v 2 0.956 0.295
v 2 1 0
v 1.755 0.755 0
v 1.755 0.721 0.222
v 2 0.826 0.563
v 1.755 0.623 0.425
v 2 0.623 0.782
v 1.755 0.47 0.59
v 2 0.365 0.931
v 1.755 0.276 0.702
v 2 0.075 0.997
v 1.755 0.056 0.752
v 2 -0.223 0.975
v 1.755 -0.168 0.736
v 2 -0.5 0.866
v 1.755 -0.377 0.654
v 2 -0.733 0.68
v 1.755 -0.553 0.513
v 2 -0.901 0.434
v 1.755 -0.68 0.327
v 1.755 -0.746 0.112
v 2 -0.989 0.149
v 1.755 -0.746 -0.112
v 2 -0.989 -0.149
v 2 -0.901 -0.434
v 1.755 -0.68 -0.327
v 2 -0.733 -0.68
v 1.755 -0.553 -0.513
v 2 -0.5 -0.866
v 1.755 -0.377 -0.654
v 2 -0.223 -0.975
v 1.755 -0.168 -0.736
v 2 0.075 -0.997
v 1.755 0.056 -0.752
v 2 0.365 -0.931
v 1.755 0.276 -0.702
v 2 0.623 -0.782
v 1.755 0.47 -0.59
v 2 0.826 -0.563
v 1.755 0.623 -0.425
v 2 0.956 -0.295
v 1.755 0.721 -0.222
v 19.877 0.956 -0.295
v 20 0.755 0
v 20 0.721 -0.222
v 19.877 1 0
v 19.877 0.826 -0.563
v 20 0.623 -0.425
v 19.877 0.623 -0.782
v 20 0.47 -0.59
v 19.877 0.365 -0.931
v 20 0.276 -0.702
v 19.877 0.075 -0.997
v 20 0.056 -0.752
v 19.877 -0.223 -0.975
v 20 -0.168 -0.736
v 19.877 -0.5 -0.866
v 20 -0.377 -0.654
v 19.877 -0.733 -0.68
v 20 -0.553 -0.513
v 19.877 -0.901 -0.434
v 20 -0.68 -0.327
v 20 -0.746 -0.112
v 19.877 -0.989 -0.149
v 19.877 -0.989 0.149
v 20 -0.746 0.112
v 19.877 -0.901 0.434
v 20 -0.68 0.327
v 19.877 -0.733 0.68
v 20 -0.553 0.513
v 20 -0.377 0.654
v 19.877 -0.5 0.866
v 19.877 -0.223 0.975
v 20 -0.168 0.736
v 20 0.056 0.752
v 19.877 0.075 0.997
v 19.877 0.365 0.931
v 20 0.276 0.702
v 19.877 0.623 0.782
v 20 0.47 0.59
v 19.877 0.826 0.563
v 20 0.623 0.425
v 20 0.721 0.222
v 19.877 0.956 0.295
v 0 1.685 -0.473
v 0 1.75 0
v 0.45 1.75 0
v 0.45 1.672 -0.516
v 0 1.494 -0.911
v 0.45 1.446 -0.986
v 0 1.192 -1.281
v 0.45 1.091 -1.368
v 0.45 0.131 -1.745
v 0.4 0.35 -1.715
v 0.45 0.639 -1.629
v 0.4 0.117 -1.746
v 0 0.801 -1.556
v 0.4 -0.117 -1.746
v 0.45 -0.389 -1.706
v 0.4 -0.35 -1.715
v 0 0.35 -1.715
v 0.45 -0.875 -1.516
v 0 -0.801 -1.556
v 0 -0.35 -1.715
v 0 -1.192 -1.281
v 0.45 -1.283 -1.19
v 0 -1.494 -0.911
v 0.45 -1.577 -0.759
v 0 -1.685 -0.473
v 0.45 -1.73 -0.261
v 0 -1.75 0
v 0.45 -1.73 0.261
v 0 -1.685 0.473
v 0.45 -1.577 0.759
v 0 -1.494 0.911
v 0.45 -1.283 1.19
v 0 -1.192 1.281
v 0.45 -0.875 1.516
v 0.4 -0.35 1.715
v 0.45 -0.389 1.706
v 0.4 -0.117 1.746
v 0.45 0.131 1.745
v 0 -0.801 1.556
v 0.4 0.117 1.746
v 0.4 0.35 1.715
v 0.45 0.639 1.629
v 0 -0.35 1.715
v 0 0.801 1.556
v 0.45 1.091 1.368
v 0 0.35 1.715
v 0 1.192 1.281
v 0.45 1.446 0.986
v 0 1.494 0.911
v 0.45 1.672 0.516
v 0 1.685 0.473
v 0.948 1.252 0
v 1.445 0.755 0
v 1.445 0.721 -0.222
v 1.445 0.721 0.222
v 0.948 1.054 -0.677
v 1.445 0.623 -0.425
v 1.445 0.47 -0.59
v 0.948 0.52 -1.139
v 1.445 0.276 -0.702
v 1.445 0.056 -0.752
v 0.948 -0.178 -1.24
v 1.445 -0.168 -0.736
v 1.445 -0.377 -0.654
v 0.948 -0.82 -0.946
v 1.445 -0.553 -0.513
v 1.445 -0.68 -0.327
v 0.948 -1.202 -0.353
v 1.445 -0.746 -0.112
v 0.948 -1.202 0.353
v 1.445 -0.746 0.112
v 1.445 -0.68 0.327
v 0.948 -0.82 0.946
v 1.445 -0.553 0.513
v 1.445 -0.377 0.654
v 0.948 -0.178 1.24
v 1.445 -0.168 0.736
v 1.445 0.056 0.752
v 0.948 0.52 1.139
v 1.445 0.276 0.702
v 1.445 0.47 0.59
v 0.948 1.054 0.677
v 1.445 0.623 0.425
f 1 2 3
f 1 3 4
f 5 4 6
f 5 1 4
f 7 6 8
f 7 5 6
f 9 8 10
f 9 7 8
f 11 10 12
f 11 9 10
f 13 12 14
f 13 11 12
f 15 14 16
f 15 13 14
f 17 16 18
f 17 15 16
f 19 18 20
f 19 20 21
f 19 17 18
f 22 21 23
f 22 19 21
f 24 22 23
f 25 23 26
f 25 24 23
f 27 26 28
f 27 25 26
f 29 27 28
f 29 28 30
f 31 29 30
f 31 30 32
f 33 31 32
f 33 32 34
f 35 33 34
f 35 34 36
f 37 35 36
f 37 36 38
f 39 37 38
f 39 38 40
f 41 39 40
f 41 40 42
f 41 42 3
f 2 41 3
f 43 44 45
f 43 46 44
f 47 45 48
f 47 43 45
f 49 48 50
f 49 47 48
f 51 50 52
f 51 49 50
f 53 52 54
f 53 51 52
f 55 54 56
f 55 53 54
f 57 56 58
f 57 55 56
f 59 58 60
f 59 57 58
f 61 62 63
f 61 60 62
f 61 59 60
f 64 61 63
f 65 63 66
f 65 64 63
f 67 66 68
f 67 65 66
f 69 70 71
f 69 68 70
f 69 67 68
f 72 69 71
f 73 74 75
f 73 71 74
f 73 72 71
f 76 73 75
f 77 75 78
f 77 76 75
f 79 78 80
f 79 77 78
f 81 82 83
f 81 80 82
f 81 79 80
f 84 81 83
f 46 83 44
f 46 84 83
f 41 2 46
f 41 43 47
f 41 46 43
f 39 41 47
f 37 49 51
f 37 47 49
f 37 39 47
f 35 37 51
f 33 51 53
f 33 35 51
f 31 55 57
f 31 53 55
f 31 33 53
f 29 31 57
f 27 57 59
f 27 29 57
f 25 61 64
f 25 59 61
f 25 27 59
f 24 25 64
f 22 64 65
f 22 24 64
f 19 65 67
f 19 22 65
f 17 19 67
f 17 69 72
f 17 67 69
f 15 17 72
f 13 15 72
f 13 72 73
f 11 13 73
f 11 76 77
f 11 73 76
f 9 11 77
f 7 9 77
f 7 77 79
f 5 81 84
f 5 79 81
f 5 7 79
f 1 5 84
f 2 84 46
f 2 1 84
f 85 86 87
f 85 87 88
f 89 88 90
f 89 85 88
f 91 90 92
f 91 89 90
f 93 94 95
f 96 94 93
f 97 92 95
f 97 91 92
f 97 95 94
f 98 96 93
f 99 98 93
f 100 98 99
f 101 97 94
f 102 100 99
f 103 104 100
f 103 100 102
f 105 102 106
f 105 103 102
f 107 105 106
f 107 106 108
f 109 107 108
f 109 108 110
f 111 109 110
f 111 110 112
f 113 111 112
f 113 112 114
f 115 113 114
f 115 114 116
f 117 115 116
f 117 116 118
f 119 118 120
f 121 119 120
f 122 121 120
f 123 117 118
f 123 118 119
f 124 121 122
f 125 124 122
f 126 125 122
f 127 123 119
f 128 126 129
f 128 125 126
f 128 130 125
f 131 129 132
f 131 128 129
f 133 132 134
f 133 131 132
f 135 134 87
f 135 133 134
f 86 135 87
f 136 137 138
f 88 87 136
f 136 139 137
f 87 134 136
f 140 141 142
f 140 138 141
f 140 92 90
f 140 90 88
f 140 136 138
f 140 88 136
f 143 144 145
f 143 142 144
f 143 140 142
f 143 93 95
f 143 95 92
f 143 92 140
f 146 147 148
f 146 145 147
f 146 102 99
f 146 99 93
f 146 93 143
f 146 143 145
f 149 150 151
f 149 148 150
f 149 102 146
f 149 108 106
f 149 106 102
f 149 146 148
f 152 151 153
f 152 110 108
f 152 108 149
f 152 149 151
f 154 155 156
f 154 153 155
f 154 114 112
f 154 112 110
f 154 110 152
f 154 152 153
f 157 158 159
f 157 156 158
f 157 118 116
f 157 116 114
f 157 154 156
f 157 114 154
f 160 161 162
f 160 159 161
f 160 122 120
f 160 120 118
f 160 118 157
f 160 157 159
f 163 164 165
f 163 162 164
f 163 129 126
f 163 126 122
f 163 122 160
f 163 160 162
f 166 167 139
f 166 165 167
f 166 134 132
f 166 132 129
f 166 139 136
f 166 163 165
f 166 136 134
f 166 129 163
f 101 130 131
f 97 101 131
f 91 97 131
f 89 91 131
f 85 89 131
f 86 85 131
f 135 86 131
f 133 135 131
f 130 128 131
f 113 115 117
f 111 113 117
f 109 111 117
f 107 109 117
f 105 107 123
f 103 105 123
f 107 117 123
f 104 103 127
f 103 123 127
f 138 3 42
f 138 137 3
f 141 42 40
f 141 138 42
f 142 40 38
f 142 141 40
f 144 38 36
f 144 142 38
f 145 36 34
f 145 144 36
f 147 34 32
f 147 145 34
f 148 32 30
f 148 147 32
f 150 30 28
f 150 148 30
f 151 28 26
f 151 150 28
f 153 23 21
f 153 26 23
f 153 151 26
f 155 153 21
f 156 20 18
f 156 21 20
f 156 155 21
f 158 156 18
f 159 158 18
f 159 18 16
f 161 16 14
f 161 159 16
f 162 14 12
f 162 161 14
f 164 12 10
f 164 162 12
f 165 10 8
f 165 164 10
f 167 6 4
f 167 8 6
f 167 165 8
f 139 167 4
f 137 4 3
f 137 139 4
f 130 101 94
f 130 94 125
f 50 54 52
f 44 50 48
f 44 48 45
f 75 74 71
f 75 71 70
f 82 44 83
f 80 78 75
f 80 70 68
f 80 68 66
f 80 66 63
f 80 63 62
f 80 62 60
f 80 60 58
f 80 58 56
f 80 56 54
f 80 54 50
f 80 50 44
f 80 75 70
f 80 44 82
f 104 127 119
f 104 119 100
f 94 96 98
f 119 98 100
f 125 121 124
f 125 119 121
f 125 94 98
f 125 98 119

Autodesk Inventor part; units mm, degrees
ref_plane "YZ Plane" through (0, 0, 0) normal (1, 0, 0) x (0, 1, 0)
ref_plane "XZ Plane" through (0, 0, 0) normal (0, 1, 0) x (-1, 0, 0)
sketch "Sketch1" plane through (0, 0, 0) normal (0, 0, 1) x (1, 0, 0)
  line L0 (0, 0) -> (20, 0)
  line L1 (20, 0) -> (20, 1)
  line L2 (20, 1) -> (2, 1)
  line L3 (2, 1) -> (1.7546, 0.7546)
  line L4 (1.7546, 0.7546) -> (1.4454, 0.7546)
  line L5 (1.4454, 0.7546) -> (0.45, 1.75)
  line L6 (0.45, 1.75) -> (0, 1.75)
  line L7 (0, 1.75) -> (0, 0)
  line L8 (2, 1) -> (1.2, 1) construction
  line L9 (-4, 0) -> (24, 0) projected
  line L10 (0, 2.1) -> (0, -0.35) projected
  dimension "d0" = 20
  dimension "d1" = 45
  dimension "d2" = 0.2454
  dimension "d3" = 18
  dimension "d4" = 1.2
  dimension "d5" = 1.5092
  dimension "d6" = 2
  dimension "d7" = 3.5
revolve "Body" add sketch "Sketch1" angle 360 about axis through (0, 0, 0) along (1, 0, 0)
sketch "Sketch2" plane through (0, 0, 0) normal (-1, 0, 0) x (0, 0, 1)
  line L0 (1.75, -0.35) -> (-1.75, -0.35)
  line L1 (-1.75, -0.35) -> (-1.75, 0.35)
  line L2 (-1.75, 0.35) -> (1.75, 0.35)
  line L3 (1.75, 0.35) -> (1.75, -0.35)
  line L4 (0, 0.35) -> (0, -0.35) construction
  line L5 (-1.75, 0) -> (1.75, 0) construction
  line L6 (0, 1.75) -> (0, 0) projected
  dimension "d15" = 0.7
  dimension "d16" = 3.5
extrude "Slot" cut sketch "Sketch2" against normal blind 0.4
thread "Thread" size "M2x0.4" class "6g" standard "ISO Metric profile" length 18
chamfer "Chamfer1" distance 0.2454 distance2 0.1227 1 edges at (20, -1, 0) measured on face at (20, -0.379, 0.3759)
ref_plane "Work Plane1" through (33.575, 0, 0) normal (0, 0, -1) x (1, 0, 0)
equation "\"d0\" = NLG"
equation "\"d1\" = 0.5 * SEWI"
equation "\"d2\" = GAL"
equation "\"d3\" = GEL"
equation "\"d4\" = KOH"
equation "\"d5\" = BDM"
equation "\"d6\" = GD"
equation "\"d7\" = KOD"
equation "\"d15\" = SBR"
equation "\"d16\" = KOD"
equation "\"d8\" = STI"
equation "\"d10\" = GEL"
equation "\"d12\" = -0.5 * SPD + 0.5 * GD"
equation "\"d13\" = 0.5 * GAL"
equation "\"NLG\" = 20"
equation "\"GAL\" = 0.61345 * PTC"
equation "\"GEL\" = 18"
equation "\"KOH\" = 1.2"
equation "\"KOD\" = 3.5"
equation "\"SEWI\" = 90deg"
equation "\"BDM\" = NND - 1.2269 * PTC"
equation "\"GD\" = NND"
equation "\"SBR\" = 0.7"
equation "\"STI\" = 0.4"
equation "\"SPD\" = NND - 1.2269 * PTC"
equation "\"GUL\" = 0.61345 * PTC"
equation "\"PTC\" = 0.4"
equation "\"EPV\" = 2.2"
equation "\"THREADDIA\" = 2"
equation "\"TOA\" = 30deg"
equation "\"RR\" = 0.2"
equation "\"NND\" = 2"
equation "\"GD1\" = THREADDIA - 1.2269 * PTC"
properties part number "AS 1427 - M2 x 20" material "Steel, Mild"
